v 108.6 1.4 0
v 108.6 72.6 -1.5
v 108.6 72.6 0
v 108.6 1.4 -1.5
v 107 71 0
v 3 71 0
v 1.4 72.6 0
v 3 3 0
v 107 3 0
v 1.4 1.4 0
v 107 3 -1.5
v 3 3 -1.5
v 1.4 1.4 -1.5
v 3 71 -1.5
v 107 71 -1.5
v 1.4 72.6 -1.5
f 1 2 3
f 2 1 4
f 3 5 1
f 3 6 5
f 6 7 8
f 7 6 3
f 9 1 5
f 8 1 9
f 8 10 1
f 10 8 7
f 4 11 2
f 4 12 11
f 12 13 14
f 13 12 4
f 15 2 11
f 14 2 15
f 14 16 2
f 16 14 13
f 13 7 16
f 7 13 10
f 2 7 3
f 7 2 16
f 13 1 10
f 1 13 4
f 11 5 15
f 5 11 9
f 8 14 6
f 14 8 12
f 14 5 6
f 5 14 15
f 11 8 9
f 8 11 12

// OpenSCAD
// file: ../../00_common/parameters.scad
// =============================================================================
// OpenMotorBridge - Global CAD Parameters & Settings
// =============================================================================
// File: hardware/cad/scad/00_common/parameters.scad
// Description: Global dimensional constants, manufacturing clearances and
//              circle resolution ($fn) for all OpenSCAD modules.
// =============================================================================

// --- 1. Circle & Curve Resolution ---
$fn = 60; // Smooth cylinders and holes for high-quality MJF 3D printing

// --- 2. Central Main Box Dimensions (3-Tier Sandwich) ---
MAIN_BOX_OUTER_L      = 110.0; // Outer length in X (mm)
MAIN_BOX_OUTER_W      = 74.0;  // Outer width in Y (mm)
MAIN_BOX_LOWER_H      = 17.0;  // Lower case height in Z (mm)
MAIN_BOX_MID_H        = 15.0;  // Mid tray height in Z (mm)
MAIN_BOX_LID_H        = 4.0;   // Lid plate thickness in Z (mm)
MAIN_BOX_WALL         = 2.5;   // Nominal wall thickness (mm)
MAIN_BOX_CORNER_POST  = 5.0;   // Corner clamping screw post size (mm)

// --- 3. Satellite Pod Dimensions (Universal 1-Pod Housing) ---
POD_OUTER_L           = 100.0; // Outer length in X (mm)
POD_OUTER_W           = 60.0;  // Outer width in Y (mm)
POD_OUTER_H           = 28.0;  // Outer height in Z (mm)
POD_WALL              = 2.5;   // Nominal wall thickness (mm)
POD_BULKHEAD_X        = 22.0;  // Partition bulkhead position in X (mm)
POD_CHAMBER_L         = 78.0;  // Sliding chamber length in X (mm)
POD_CHAMBER_W         = 55.0;  // Sliding chamber width in Y (mm)
POD_CHAMBER_H         = 23.0;  // Sliding chamber height in Z (mm)

// --- 4. Pod Linear Guide Rails (Poka-Yoke Tongue & Groove) ---
POD_GROOVE_W          = 3.0;   // Internal guide groove width in Z (mm)
POD_GROOVE_DEPTH      = 1.5;   // Internal guide groove depth in Y (mm)
POD_GROOVE_LEFT_Z     = 8.2;   // Center height of left groove (mm)
POD_GROOVE_RIGHT_Z    = 14.2;  // Center height of right groove (mm, asym offset)

CARTRIDGE_TONGUE_W    = 2.6;   // Cartridge tongue rail height in Z (mm, 0.2mm clearance)
CARTRIDGE_TONGUE_PROT = 1.4;   // Cartridge tongue protrusion in Y (mm, 0.1mm clearance)
CARTRIDGE_CHAMFER_L   = 4.0;   // 30° lead-in chamfer nose length (mm)

// --- 5. Cartridge Dimensions ---
CARTRIDGE_BASE_L      = 75.0;  // Sled length in X (mm)
CARTRIDGE_BASE_W      = 54.0;  // Sled width in Y (mm)
CARTRIDGE_BASE_H      = 20.5;  // Sled height in Z (mm)
CARTRIDGE_FACE_L      = 4.0;   // Front faceplate thickness in X (mm)
CARTRIDGE_FACE_W      = 58.0;  // Front faceplate width in Y (mm)
CARTRIDGE_FACE_H      = 25.0;  // Front faceplate height in Z (mm)

// --- 6. Thermal Copper Studs (Kühlbolzen) ---
COPPER_STUD_DIA       = 8.0;   // Diameter of thermal copper studs (mm)
COPPER_STUD_R         = COPPER_STUD_DIA / 2.0; // Radius = 4.0 mm

// Main Box Thermal Stud Positions (4x in lower case floor)
MAIN_BOX_CU_POS = [
    [35.0, 25.0], // Position 1 (LM5164 DCDC Buck Regulator)
    [45.0, 25.0], // Position 2 (BQ25798 LiPo Charger)
    [30.0, 48.0], // Position 3 (ESP32-S3 Dual-Core SoC)
    [70.0, 40.0]  // Position 4 (Automotive TVS & LC Filter Zone)
];

// Pod & Cartridge Thermal Stud Positions (2x in floor)
POD_CU_POS = [
    [42.0, 30.0], // Forward thermal zone
    [72.0, 30.0]  // Rearward thermal zone
];

// --- 7. Screw & Clearance Dimensions ---
M2_SCREW_HOLE_R       = 1.1;   // M2 clearance hole (r = 1.1 mm -> Ø 2.2 mm)
M2_5_SCREW_HOLE_R     = 1.4;   // M2.5 clearance hole (r = 1.4 mm -> Ø 2.8 mm)
M3_SCREW_HOLE_R       = 1.65;  // M3 clearance hole (r = 1.65 mm -> Ø 3.3 mm)
M4_SCREW_HOLE_R       = 2.2;   // M4 clearance hole (r = 2.2 mm -> Ø 4.4 mm)
M8_BORE_R             = 4.0;   // M8 cable through-bore (r = 4.0 mm -> Ø 8.0 mm)
M8_STUDS_OUTER_R      = 6.0;   // M8 neck outer radius (Ø 12.0 mm)
// main file
// =============================================================================
// OpenMotorBridge - Main Box: Perimeter Sealing Groove & Tongue (Nut & Feder)
// =============================================================================
// File: hardware/cad/scad/01_main_box/parts/005_sealing_groove.scad
// =============================================================================

include <../../00_common/parameters.scad>;

// 1. Gasket Groove Cutout Tool (Nut for Lower Case upper rim: 2.0 mm wide x 1.8 mm deep)
module main_box_sealing_groove_tool(length=110.0, width=74.0, z_top=17.0, groove_w=2.0, groove_depth=1.8) {
    translate([0, 0, z_top - groove_depth]) {
        difference() {
            translate([1.2, 1.2, 0])
                cube(size=[length - 2.4, width - 2.4, groove_depth + 0.1], center=false);
            translate([1.2 + groove_w, 1.2 + groove_w, -0.1])
                cube(size=[length - 2.4 - 2*groove_w, width - 2.4 - 2*groove_w, groove_depth + 0.3], center=false);
        }
    }
}

// 2. Gasket Tongue / Lip (Feder for Mid Tray lower rim: 1.6 mm wide x 1.5 mm high)
module main_box_sealing_tongue_lip(length=110.0, width=74.0, lip_w=1.6, lip_h=1.5) {
    difference() {
        translate([1.4, 1.4, -lip_h])
            cube(size=[length - 2.8, width - 2.8, lip_h], center=false);
        translate([1.4 + lip_w, 1.4 + lip_w, -lip_h - 0.1])
            cube(size=[length - 2.8 - 2*lip_w, width - 2.8 - 2*lip_w, lip_h + 0.2], center=false);
    }
}

// Standalone preview
main_box_sealing_tongue_lip();
